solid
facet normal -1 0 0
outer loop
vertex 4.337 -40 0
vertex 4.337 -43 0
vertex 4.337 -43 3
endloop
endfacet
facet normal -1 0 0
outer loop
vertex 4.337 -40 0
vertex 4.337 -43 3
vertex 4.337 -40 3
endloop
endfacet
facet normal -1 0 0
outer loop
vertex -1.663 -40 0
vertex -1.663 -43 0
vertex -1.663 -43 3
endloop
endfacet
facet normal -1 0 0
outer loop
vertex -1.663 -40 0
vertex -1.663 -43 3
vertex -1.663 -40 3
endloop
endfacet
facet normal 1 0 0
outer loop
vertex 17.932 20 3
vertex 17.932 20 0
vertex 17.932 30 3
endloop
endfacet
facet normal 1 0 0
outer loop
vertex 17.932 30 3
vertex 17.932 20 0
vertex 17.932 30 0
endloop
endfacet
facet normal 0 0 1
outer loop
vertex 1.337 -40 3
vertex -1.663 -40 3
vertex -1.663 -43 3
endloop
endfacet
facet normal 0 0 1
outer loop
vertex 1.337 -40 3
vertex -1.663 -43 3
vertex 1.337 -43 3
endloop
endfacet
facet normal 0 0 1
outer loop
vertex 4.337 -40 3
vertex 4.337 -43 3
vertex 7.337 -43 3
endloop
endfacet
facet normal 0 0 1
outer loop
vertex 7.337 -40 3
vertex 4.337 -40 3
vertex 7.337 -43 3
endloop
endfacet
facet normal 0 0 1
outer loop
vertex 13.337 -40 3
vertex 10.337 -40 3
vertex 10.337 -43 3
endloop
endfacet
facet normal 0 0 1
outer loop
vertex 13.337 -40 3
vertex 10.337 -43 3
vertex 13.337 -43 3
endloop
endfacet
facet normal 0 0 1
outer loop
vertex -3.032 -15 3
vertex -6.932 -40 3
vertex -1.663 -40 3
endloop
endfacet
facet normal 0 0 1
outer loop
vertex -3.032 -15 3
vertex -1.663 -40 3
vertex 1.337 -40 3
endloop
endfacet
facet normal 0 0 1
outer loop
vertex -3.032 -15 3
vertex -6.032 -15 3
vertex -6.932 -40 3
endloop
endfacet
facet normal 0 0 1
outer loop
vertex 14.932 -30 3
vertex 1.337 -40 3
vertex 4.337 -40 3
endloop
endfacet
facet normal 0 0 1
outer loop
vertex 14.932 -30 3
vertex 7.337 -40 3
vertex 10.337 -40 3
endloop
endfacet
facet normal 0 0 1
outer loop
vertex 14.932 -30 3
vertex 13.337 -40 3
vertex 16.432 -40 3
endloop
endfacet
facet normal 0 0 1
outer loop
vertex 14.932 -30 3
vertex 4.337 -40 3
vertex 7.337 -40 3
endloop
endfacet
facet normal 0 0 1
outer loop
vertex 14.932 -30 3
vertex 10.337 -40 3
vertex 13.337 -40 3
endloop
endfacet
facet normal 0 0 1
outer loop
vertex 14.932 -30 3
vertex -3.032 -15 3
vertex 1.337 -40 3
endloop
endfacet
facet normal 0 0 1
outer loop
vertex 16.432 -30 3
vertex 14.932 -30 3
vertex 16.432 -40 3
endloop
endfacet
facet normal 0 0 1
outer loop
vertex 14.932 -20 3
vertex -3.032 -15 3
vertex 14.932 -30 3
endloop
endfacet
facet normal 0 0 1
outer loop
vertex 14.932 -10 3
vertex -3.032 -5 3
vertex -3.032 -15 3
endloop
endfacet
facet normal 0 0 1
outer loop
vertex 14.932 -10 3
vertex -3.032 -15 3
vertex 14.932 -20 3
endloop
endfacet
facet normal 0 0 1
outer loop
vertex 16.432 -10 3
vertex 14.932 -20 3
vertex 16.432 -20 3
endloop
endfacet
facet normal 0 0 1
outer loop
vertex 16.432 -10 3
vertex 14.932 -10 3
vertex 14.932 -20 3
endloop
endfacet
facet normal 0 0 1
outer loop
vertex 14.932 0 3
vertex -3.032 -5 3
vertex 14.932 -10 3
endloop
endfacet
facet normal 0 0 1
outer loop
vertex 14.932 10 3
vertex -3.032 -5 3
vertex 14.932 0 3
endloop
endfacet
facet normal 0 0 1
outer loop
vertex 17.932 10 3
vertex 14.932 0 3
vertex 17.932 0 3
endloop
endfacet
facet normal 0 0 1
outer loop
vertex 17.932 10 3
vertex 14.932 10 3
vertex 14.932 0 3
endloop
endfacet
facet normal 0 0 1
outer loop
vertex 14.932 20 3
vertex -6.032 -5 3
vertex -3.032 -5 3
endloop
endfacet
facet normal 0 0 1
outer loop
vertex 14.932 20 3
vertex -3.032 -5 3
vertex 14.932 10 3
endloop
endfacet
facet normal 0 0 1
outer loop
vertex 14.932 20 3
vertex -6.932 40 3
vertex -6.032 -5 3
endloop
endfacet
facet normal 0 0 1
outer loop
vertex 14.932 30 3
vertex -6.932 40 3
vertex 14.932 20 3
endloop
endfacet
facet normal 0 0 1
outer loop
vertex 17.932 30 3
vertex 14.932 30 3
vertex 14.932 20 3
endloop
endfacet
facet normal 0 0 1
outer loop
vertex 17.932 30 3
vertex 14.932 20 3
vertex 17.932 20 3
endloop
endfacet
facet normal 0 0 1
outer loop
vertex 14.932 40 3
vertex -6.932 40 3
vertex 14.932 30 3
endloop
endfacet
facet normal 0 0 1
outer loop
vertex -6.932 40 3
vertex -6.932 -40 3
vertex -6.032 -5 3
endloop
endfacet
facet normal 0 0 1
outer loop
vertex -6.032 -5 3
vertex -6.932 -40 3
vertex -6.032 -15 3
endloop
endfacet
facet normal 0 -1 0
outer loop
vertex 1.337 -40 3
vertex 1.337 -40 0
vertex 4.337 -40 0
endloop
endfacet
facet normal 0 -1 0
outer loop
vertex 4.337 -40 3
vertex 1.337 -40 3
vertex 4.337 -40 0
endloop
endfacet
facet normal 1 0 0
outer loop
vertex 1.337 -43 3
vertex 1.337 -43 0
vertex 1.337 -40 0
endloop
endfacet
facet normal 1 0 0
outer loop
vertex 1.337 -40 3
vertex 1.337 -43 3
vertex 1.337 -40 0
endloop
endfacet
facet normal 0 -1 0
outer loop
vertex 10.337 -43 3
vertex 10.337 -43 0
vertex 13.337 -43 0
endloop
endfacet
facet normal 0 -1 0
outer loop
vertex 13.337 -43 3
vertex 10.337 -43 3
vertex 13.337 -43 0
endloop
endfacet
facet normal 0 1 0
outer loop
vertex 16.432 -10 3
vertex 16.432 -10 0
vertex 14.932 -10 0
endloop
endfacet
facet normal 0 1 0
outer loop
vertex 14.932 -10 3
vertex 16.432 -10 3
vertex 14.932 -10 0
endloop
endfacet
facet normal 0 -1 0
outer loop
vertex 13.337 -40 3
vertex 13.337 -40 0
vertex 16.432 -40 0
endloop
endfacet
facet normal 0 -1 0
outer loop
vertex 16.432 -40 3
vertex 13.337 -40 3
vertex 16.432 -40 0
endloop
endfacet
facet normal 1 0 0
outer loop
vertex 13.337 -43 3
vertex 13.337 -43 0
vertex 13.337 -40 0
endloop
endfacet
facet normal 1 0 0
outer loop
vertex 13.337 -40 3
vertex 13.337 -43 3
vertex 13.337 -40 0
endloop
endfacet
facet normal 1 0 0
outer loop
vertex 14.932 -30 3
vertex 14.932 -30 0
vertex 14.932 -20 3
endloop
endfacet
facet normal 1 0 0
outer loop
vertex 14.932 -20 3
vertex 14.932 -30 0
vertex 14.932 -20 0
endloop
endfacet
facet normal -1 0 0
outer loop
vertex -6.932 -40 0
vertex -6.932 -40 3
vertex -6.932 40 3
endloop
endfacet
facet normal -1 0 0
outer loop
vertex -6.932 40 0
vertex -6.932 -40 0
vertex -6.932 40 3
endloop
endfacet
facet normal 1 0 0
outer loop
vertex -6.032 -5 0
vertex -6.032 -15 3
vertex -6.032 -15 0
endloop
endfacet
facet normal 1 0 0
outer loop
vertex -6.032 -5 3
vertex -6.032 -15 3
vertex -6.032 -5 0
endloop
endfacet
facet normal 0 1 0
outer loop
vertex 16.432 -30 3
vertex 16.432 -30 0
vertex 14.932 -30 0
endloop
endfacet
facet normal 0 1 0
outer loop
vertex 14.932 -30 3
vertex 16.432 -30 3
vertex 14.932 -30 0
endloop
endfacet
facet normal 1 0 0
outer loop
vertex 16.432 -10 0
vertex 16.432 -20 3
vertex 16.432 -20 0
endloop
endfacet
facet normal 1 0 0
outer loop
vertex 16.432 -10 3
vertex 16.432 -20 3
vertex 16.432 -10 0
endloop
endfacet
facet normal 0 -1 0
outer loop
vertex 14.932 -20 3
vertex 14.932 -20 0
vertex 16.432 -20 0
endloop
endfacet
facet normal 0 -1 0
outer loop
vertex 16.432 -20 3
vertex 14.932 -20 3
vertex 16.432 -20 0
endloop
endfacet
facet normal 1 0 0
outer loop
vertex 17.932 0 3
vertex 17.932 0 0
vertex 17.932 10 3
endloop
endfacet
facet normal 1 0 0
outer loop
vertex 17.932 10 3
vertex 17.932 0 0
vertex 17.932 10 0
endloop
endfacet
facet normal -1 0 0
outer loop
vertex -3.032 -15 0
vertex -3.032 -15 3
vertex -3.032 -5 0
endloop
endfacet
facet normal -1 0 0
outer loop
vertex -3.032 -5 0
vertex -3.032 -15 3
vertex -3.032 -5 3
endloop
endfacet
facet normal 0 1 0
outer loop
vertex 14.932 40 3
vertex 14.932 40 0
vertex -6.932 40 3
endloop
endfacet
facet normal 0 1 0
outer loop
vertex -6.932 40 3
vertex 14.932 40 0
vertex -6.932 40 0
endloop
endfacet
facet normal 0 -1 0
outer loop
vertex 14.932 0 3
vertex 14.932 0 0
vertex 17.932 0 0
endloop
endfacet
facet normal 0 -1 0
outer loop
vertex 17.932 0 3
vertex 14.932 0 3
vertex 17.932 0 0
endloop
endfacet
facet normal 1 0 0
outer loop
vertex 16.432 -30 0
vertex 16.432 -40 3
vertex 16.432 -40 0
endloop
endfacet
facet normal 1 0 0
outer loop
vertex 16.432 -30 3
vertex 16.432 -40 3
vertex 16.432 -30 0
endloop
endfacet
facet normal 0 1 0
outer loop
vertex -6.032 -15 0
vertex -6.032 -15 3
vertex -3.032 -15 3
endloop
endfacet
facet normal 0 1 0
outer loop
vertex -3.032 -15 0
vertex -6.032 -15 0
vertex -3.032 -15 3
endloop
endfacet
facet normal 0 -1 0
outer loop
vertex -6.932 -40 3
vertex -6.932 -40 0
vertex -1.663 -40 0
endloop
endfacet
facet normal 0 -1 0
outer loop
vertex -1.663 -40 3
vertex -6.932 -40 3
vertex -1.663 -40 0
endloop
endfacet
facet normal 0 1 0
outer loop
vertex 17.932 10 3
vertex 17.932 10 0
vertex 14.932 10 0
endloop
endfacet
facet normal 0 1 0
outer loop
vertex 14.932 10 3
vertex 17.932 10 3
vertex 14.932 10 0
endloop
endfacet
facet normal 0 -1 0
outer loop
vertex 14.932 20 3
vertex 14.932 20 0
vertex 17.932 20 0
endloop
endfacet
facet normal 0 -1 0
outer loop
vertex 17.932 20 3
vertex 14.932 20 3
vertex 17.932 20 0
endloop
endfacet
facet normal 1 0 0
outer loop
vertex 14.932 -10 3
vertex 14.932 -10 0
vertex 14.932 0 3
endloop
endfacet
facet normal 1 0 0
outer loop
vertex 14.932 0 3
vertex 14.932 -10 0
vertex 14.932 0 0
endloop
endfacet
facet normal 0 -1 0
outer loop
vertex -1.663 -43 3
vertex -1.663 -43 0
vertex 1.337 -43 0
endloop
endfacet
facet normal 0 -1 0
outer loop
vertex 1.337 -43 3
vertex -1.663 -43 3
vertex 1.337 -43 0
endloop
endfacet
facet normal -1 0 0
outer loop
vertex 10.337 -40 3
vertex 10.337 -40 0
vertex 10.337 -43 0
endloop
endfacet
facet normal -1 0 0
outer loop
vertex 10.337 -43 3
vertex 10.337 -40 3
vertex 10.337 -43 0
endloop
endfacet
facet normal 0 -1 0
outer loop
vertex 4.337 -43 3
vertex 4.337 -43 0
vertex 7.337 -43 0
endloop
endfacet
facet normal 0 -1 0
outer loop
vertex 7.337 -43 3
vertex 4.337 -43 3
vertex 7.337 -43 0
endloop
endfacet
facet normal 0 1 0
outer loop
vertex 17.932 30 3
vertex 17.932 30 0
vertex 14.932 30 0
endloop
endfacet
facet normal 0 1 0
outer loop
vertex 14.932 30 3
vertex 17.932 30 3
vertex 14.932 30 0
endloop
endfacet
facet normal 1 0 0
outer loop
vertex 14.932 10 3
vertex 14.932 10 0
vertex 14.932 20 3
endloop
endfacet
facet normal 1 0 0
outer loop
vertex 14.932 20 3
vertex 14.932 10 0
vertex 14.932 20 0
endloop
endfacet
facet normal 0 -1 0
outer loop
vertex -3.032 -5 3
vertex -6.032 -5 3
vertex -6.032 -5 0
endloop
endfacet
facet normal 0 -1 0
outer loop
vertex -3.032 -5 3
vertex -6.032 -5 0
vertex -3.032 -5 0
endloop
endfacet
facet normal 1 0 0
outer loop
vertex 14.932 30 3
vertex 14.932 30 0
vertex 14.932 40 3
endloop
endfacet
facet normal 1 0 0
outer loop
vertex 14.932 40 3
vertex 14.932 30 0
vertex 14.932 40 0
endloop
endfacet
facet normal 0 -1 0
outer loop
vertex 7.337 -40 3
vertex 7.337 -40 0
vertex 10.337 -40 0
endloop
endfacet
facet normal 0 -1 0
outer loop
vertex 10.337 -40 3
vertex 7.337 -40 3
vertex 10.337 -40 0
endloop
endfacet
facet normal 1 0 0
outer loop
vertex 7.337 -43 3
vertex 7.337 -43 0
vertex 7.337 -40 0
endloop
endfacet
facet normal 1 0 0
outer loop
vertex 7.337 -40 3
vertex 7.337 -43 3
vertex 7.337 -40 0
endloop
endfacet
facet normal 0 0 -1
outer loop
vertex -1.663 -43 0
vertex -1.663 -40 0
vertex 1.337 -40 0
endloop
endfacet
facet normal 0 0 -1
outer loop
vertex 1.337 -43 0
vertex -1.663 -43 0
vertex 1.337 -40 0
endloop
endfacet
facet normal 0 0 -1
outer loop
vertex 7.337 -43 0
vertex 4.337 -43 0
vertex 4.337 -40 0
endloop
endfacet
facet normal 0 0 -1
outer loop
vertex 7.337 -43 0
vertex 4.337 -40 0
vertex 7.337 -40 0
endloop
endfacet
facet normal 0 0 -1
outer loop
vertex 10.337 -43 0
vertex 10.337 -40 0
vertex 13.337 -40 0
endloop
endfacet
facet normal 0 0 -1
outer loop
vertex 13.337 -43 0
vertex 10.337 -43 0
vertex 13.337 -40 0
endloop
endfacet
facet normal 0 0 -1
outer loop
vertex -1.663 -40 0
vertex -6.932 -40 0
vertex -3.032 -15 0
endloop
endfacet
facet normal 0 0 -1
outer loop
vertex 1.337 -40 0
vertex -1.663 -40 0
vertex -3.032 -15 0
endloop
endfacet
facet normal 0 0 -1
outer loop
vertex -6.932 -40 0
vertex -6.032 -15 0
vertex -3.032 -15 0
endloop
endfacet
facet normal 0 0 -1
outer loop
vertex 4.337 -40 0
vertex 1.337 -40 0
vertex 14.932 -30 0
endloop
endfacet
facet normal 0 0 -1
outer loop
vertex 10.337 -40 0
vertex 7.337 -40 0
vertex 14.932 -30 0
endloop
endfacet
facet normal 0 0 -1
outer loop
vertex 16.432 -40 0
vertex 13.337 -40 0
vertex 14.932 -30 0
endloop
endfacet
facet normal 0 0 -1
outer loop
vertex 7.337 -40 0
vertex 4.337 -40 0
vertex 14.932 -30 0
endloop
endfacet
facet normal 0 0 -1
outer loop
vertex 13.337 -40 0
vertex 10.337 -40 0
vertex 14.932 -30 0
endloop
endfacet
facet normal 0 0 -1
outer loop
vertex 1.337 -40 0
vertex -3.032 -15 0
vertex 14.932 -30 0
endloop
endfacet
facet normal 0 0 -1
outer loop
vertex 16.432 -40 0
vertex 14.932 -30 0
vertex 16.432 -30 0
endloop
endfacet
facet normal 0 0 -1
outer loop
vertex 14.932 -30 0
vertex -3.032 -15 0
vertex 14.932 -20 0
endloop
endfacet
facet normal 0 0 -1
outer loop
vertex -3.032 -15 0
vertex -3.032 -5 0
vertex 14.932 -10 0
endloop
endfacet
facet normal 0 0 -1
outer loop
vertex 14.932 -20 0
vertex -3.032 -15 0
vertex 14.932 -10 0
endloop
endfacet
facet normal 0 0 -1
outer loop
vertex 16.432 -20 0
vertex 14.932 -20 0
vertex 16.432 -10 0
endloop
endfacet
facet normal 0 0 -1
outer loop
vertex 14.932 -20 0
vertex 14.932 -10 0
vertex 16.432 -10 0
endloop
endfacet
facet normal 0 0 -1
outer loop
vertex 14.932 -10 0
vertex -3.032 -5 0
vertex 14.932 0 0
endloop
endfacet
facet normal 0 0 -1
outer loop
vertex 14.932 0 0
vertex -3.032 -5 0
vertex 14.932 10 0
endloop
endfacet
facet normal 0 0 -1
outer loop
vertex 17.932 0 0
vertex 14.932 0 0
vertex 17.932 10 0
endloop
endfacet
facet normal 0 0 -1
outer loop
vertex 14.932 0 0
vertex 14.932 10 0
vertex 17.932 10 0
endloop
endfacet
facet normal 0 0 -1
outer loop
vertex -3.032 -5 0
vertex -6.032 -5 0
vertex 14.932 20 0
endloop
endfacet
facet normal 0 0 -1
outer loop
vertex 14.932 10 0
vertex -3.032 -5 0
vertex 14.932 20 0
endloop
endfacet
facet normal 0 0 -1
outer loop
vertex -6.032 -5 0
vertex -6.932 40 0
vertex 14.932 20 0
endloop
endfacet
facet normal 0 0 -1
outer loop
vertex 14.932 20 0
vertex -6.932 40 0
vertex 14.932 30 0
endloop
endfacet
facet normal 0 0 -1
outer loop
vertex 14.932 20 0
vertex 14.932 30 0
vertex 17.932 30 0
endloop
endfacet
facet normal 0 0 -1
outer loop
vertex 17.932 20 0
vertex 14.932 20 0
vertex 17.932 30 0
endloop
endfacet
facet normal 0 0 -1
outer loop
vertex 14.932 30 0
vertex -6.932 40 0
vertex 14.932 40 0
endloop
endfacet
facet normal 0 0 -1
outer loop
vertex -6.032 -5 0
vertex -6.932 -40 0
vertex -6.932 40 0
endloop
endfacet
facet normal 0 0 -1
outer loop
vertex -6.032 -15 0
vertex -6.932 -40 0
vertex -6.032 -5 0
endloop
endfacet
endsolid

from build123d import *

# Parameters (mm, degrees)
F0_W     = 3
F0_H     = 3
F0_H_2   = 10
F1_DEPTH = 3
F2_W     = 8
F2_H     = 80
F3_DEPTH = 25
F4_W     = 1.5
F4_H     = 10
F5_DEPTH = 25
F6_W     = 3
F6_H     = 10
F7_DEPTH = 25


with BuildPart() as f1:
    # F0 (on Top) → F1 (new body)
    with BuildSketch(Plane.XY):
        with Locations((-0.16321, -41.5)):
            Rectangle(F0_W, F0_H)
        with Locations((5.83679, -41.5)):
            Rectangle(F0_W, F0_H)
        Polygon((11.93179, 40), (-14.93179, 40), (-14.93179, -40), (-1.66321, -40), (1.33679, -40), (4.33679, -40), (7.33679, -40), (10.33679, -40), (11.93179, -40), (11.93179, -30), (11.93179, -20), (11.93179, -10), (11.93179, 0), (11.93179, 10), (11.93179, 20), (11.93179, 30), align=None)
        Polygon((11.93179, -30), (11.93179, -40), (13.33679, -40), (14.93179, -40), (14.93179, -30), align=None)
        with Locations((13.43179, -25)):
            Rectangle(F0_W, F0_H_2)
        Polygon((17.93179, -30), (14.93179, -30), (14.93179, -40), (16.52679, -40), (17.93179, -40), align=None)
        Polygon((11.93179, -40), (10.33679, -40), (10.33679, -43), (13.33679, -43), (13.33679, -40), align=None)
        with Locations((13.43179, -15)):
            Rectangle(F0_W, F0_H_2)
        with Locations((16.43179, -15)):
            Rectangle(F0_W, F0_H_2)
        with Locations((13.43179, -5)):
            Rectangle(F0_W, F0_H_2)
        with Locations((16.43179, 5)):
            Rectangle(F0_W, F0_H_2)
        with Locations((13.43179, 5)):
            Rectangle(F0_W, F0_H_2)
        with Locations((13.43179, 15)):
            Rectangle(F0_W, F0_H_2)
        with Locations((13.43179, 25)):
            Rectangle(F0_W, F0_H_2)
        with Locations((16.43179, 25)):
            Rectangle(F0_W, F0_H_2)
        with Locations((13.43179, 35)):
            Rectangle(F0_W, F0_H_2)
    extrude(amount=F1_DEPTH)

    # F2 (on face) → F3 (cut)
    with BuildSketch(Plane.XY.offset(3)):
        with Locations((-10.93179, 0)):
            Rectangle(F2_W, F2_H)
    extrude(amount=-F3_DEPTH, mode=Mode.SUBTRACT)

    # F4 (on face) → F5 (cut)
    with BuildSketch(Plane.XY.offset(3)):
        with Locations((17.18179, -35)):
            Rectangle(F4_W, F4_H)
        with Locations((17.18179, -15)):
            Rectangle(F4_W, F4_H)
    extrude(amount=-F5_DEPTH, mode=Mode.SUBTRACT)

    # F6 (on face) → F7 (cut)
    with BuildSketch(Plane.XY.offset(3)):
        with Locations((-4.53179, -10)):
            Rectangle(F6_W, F6_H)
    extrude(amount=-F7_DEPTH, mode=Mode.SUBTRACT)


solid = f1.part
